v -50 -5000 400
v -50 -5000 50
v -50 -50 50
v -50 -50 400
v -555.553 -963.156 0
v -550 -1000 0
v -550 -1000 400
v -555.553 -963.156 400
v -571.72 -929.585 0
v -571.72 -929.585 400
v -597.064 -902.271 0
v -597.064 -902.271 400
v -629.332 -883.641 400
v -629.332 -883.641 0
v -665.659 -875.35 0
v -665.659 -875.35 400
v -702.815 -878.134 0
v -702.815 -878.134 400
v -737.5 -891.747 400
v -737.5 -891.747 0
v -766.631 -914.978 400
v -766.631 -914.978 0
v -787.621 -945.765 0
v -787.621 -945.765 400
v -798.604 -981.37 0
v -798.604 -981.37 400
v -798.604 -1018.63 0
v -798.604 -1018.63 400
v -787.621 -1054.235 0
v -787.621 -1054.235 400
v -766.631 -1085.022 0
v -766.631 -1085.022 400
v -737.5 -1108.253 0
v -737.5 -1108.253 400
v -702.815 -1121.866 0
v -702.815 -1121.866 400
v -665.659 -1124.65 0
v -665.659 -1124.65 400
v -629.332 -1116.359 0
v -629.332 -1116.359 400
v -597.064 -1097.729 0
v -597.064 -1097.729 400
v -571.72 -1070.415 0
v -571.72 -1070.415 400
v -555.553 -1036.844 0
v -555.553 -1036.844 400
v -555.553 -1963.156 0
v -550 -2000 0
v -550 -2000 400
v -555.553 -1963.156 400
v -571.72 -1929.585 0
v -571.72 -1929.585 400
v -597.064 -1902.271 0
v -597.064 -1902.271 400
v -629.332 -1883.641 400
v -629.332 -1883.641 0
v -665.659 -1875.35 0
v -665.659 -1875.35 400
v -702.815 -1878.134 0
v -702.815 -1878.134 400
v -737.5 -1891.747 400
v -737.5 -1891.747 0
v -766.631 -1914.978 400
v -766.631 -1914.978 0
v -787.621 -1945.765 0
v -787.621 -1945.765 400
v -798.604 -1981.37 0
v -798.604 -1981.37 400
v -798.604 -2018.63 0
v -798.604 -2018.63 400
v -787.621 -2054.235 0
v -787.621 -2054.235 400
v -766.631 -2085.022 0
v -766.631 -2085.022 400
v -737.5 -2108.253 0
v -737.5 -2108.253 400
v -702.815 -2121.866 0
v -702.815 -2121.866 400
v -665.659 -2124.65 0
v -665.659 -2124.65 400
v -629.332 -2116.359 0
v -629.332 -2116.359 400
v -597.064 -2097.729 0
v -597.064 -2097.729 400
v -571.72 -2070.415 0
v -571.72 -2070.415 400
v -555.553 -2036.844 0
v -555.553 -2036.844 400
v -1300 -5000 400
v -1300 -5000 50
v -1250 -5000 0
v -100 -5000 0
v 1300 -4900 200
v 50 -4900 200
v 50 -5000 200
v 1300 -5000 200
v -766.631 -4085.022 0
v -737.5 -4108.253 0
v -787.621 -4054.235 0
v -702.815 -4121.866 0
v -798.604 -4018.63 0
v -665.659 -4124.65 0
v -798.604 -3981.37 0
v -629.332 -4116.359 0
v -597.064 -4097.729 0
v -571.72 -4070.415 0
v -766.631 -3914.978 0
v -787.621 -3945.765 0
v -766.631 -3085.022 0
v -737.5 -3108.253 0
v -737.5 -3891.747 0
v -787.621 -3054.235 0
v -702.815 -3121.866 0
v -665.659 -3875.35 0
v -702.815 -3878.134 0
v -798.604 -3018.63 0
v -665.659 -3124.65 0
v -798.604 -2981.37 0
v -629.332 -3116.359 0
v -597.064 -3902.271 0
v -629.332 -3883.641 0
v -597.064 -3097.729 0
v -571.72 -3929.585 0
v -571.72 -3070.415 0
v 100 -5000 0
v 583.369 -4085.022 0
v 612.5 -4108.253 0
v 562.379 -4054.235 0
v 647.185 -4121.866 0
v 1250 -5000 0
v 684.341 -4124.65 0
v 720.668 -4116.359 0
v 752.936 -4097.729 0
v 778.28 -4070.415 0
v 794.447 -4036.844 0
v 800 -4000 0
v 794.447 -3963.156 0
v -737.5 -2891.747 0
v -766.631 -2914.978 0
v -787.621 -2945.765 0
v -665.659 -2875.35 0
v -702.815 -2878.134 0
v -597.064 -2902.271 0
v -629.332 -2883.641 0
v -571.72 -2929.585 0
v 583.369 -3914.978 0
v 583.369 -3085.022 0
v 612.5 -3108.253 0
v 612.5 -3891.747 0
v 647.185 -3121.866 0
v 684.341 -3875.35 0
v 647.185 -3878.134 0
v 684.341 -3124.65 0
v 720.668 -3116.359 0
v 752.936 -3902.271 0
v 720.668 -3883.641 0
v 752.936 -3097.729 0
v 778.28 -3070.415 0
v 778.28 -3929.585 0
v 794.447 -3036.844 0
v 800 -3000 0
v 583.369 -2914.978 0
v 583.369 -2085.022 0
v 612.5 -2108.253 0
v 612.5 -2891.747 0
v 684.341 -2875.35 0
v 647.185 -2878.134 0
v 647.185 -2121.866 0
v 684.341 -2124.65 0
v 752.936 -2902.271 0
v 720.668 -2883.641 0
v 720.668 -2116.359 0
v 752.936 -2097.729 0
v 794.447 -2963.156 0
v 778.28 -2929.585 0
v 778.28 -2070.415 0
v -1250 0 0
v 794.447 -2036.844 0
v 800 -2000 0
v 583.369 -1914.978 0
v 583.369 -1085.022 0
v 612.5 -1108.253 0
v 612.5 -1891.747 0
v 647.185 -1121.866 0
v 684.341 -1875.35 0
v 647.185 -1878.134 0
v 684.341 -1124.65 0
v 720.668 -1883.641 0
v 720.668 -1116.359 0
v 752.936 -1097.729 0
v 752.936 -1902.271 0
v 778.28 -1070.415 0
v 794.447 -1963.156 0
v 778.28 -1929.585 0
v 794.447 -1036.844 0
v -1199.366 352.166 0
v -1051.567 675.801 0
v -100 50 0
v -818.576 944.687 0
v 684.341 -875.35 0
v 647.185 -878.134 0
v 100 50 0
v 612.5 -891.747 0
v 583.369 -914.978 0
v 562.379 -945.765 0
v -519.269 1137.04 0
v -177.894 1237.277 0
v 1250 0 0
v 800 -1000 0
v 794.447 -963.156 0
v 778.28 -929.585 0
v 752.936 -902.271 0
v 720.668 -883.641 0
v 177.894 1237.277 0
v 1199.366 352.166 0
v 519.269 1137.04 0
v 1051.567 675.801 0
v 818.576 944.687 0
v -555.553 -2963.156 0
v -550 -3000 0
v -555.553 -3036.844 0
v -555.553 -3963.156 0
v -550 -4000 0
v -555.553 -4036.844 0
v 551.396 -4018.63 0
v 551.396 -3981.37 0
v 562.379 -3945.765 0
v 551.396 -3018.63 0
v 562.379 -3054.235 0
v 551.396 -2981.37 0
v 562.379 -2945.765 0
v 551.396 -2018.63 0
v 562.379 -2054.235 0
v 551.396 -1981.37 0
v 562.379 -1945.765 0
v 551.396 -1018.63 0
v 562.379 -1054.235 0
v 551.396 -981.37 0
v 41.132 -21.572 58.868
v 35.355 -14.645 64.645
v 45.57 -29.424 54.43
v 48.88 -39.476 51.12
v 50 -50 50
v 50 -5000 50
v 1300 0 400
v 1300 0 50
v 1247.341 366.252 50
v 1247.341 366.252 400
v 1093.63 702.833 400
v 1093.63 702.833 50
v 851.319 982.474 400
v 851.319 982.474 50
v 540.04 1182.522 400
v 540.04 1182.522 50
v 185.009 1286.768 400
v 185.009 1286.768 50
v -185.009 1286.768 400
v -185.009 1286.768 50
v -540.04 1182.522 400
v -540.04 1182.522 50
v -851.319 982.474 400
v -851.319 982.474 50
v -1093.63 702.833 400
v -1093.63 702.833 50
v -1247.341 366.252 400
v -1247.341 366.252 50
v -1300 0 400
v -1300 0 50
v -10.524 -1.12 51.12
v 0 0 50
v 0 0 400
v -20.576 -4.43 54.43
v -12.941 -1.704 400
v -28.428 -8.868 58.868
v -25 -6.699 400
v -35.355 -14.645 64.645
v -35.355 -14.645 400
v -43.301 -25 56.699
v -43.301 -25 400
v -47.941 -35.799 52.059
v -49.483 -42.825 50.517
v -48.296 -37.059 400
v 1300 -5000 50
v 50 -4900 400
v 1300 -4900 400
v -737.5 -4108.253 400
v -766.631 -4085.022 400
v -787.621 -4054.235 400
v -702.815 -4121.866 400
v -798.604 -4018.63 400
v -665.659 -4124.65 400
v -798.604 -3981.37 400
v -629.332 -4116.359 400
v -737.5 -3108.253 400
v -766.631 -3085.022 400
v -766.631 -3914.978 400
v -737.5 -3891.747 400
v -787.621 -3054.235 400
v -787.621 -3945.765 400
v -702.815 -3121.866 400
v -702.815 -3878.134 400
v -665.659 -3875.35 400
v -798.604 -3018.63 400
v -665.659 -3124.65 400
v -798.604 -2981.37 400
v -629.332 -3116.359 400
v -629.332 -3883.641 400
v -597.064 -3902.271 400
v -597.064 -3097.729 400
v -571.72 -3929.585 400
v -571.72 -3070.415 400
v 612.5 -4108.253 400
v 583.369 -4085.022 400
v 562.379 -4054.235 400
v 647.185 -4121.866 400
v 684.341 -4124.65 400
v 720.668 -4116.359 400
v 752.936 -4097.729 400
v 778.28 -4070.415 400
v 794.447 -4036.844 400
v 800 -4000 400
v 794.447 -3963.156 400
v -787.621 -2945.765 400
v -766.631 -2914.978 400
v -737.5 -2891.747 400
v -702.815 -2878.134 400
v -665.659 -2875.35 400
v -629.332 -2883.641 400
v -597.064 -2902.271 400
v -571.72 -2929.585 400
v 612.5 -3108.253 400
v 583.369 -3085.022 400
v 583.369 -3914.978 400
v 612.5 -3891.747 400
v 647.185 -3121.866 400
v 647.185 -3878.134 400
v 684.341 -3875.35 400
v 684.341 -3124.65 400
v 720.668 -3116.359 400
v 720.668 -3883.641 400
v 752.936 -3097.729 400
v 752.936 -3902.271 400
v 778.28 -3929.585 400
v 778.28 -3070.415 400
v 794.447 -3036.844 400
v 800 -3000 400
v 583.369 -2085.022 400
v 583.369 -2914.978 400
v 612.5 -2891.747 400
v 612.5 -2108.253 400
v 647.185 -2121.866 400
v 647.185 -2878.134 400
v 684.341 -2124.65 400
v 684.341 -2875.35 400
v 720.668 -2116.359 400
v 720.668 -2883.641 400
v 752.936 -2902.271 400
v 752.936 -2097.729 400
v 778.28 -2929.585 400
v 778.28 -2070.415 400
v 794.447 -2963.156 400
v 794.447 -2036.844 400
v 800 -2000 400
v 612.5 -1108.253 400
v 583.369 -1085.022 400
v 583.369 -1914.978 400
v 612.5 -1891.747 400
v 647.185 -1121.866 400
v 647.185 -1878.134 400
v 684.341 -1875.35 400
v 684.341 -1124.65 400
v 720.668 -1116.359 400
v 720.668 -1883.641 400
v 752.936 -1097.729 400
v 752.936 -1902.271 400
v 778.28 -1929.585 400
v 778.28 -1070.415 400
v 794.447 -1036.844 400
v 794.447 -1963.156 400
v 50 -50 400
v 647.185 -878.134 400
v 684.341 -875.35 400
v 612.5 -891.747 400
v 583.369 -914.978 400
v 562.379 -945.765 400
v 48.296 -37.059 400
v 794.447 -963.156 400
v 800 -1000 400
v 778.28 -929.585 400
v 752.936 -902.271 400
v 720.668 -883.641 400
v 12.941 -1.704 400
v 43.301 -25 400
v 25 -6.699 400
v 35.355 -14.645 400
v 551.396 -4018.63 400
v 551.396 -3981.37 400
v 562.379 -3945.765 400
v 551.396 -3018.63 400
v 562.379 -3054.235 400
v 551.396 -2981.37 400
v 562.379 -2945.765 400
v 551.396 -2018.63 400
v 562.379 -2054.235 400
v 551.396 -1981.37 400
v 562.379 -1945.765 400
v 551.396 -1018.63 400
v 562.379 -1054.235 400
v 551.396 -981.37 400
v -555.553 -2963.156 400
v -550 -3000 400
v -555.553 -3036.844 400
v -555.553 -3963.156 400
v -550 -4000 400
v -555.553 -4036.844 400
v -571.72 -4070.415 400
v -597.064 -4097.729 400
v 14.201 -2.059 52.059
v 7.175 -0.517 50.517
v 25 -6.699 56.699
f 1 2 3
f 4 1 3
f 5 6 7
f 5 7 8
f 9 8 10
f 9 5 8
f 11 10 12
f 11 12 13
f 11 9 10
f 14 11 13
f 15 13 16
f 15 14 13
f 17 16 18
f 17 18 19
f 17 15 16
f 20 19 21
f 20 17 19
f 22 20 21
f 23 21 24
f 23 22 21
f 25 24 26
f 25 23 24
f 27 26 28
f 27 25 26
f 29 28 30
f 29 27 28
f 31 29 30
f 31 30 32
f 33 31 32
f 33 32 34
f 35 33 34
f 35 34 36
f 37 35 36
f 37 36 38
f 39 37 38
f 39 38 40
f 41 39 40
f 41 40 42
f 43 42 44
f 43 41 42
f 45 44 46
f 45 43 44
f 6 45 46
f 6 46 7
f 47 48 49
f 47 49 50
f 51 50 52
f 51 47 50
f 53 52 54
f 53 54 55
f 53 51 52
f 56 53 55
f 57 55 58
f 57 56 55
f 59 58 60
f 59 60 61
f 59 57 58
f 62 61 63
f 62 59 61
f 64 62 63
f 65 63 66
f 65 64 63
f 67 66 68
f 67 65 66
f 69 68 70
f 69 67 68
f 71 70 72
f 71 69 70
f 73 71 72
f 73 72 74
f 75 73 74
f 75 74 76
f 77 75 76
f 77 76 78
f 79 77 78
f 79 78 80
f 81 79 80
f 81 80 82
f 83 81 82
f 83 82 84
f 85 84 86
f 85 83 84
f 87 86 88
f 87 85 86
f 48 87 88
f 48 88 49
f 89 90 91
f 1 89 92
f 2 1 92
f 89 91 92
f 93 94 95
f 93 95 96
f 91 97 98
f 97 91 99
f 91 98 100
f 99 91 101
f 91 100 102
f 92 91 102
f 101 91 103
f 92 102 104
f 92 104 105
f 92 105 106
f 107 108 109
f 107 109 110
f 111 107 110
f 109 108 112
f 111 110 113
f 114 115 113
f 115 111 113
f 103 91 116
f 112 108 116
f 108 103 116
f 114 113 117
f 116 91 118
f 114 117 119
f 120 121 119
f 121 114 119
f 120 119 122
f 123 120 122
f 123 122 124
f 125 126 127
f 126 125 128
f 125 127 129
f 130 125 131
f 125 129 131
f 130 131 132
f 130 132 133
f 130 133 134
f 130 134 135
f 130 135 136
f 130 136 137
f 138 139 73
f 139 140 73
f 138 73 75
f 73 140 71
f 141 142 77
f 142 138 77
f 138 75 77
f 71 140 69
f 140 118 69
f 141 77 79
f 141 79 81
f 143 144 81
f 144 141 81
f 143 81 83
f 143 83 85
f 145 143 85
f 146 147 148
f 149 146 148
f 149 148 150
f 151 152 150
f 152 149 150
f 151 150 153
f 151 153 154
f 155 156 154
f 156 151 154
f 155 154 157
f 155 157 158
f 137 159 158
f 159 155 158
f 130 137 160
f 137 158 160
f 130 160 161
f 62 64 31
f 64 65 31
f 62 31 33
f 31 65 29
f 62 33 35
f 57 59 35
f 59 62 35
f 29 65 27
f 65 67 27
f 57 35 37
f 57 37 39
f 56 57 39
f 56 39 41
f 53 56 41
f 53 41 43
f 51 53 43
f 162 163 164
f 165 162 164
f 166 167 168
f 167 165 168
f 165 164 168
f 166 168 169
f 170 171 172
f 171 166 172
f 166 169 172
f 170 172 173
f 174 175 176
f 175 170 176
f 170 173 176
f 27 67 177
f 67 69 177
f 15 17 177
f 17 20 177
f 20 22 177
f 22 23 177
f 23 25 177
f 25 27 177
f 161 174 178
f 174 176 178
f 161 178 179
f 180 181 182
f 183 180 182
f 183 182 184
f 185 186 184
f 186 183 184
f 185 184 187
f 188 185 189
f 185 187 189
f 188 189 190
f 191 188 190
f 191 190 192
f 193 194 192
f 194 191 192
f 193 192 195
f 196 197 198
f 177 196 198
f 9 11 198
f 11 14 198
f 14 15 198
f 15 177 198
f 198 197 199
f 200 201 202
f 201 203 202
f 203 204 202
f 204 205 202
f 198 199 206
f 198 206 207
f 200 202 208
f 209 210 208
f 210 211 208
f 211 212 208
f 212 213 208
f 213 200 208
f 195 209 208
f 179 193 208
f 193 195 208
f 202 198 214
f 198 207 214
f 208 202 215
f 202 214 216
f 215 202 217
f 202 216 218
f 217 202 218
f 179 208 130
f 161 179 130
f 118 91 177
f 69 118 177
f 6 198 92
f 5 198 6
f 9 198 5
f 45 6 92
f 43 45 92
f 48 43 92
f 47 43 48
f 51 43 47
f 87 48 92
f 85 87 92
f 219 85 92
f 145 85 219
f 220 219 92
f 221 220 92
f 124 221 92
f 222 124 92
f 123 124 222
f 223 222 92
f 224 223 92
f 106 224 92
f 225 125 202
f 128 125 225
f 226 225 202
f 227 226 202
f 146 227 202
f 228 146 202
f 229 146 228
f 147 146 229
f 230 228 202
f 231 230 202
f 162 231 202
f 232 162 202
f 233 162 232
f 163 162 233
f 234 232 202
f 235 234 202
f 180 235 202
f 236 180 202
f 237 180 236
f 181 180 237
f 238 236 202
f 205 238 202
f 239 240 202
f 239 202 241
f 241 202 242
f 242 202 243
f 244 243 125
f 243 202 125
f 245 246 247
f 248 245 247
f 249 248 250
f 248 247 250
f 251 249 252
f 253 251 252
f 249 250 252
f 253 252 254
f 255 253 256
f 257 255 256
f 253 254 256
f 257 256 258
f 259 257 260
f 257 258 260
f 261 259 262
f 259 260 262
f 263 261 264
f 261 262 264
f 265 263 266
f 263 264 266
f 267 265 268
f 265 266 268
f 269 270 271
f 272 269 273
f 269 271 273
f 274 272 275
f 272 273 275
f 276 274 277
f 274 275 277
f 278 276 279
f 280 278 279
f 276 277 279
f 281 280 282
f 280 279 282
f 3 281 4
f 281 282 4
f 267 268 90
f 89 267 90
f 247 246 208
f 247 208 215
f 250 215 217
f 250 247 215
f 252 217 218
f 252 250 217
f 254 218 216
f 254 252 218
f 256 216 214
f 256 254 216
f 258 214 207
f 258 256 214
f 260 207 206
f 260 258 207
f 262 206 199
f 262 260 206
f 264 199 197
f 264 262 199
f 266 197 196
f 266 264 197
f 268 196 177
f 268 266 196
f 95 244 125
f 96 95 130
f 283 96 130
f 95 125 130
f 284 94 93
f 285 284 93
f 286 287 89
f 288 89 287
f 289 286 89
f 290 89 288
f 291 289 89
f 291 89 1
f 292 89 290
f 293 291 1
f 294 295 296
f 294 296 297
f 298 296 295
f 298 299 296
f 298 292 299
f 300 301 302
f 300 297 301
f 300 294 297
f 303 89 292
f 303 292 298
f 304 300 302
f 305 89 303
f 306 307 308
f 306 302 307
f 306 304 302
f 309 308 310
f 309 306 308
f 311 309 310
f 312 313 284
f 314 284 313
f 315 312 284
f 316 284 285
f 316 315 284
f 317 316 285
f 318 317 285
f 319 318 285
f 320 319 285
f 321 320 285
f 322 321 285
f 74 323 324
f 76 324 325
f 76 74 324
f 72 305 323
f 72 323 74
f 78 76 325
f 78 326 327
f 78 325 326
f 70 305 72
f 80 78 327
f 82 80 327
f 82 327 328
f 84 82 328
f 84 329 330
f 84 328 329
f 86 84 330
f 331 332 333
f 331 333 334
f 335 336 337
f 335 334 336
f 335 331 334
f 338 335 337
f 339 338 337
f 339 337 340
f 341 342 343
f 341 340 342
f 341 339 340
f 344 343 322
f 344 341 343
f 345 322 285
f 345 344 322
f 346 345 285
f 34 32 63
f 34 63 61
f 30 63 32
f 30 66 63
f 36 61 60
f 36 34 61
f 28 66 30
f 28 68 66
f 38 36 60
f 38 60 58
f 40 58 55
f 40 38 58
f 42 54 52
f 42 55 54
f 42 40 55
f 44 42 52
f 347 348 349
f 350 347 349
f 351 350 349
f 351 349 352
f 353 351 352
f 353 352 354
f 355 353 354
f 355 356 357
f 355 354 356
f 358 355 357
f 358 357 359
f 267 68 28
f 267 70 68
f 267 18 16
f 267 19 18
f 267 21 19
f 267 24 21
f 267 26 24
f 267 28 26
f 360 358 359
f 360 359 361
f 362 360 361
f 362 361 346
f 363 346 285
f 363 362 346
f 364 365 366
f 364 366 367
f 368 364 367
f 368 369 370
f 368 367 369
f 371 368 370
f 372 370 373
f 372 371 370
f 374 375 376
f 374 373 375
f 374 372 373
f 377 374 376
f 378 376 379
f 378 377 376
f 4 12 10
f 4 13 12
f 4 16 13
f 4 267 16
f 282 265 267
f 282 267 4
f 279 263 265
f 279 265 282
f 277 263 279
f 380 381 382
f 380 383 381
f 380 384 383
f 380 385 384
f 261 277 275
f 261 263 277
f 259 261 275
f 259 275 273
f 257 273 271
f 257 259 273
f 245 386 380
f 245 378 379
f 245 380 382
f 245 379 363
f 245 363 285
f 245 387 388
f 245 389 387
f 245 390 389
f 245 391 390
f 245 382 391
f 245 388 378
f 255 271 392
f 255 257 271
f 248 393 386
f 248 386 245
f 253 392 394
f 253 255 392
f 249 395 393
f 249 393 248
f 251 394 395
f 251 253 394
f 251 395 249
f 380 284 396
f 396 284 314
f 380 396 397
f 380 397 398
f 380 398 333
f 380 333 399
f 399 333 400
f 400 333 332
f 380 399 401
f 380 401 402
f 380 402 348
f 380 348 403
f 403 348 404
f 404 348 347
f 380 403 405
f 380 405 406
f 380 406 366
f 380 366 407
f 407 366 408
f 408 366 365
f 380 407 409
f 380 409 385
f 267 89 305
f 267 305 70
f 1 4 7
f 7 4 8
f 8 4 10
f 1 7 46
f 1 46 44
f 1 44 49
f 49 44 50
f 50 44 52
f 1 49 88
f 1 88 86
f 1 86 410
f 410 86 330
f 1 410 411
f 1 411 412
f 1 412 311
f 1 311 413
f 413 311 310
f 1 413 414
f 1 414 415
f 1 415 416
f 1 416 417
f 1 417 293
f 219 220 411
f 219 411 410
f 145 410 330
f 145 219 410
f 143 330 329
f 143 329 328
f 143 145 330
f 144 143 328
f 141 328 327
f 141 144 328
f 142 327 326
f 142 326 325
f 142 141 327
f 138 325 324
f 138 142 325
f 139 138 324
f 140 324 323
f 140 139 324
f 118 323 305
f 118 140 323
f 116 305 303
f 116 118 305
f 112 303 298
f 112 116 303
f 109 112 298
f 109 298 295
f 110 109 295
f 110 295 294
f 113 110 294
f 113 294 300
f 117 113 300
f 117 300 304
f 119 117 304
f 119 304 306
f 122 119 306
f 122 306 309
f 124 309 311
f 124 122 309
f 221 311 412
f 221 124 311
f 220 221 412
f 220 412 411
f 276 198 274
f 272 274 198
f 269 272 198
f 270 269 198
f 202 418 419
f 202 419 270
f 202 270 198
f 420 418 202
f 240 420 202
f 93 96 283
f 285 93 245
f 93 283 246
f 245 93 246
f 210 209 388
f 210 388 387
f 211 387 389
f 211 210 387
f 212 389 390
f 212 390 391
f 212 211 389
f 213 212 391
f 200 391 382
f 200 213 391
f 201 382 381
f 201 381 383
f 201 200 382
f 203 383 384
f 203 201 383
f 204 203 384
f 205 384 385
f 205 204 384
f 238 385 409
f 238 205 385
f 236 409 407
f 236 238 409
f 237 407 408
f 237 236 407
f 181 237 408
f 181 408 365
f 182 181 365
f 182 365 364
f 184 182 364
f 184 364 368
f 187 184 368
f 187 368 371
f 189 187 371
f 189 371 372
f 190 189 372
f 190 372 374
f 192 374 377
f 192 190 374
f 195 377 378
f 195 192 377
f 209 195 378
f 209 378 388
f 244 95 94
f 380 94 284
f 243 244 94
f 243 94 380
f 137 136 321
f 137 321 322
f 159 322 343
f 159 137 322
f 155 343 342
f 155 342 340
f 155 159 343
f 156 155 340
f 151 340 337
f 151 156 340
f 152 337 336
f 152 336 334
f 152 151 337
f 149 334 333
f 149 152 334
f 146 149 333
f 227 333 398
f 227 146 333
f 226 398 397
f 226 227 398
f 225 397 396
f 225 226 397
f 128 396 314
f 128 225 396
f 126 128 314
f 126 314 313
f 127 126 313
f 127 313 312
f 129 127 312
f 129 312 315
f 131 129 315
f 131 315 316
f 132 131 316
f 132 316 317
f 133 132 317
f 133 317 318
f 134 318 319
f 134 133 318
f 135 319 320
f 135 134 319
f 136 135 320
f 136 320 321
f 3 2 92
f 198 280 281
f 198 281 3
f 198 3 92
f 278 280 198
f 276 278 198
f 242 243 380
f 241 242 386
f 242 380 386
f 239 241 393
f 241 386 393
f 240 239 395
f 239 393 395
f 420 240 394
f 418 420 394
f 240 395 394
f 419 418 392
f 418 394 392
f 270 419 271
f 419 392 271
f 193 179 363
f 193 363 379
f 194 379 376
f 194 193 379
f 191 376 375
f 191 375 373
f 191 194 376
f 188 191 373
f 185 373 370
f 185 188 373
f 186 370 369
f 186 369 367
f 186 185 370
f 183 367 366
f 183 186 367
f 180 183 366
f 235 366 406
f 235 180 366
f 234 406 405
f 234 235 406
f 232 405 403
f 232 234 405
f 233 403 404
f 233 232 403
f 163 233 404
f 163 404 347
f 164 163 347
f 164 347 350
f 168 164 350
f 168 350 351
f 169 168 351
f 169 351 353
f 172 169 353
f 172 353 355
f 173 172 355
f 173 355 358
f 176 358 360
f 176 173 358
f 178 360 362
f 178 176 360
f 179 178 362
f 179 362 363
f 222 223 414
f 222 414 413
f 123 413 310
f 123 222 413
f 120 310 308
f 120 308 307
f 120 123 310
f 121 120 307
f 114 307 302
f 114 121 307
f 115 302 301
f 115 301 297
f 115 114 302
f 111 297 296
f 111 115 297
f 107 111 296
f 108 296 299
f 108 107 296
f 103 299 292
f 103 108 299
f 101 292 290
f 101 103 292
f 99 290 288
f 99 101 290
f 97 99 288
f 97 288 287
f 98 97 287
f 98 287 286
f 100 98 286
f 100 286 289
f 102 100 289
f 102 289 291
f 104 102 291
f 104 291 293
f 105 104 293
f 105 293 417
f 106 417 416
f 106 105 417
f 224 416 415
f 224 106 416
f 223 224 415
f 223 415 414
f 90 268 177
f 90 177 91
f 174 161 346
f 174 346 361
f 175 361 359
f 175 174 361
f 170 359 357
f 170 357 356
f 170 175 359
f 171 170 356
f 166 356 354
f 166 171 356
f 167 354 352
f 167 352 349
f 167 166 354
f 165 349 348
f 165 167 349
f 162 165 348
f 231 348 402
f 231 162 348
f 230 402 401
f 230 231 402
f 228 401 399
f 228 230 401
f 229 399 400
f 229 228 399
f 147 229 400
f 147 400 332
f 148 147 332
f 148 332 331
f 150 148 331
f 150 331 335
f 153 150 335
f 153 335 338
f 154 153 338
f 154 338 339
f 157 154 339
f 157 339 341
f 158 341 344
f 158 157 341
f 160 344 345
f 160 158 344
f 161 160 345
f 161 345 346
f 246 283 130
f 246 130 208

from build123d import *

# Parameters (mm, degrees)
F0_R     = 125
F1_DEPTH = 400
F0_W     = 1250
F0_H     = 100
F2_DEPTH = 200
F3_SIZE  = 50
F4_R     = 49.99999


# Not quite as in the source:
# - a fillet or chamfer is up to 0.001 mm smaller than in the source, because OpenCascade refuses the exact size


with BuildPart() as f1:
    # F0 (on Top) → F1 (new body)
    with BuildSketch(Plane.XY):
        with BuildLine():
            Line((-50, 0), (0, 0))
            Line((0, 0), (50, 0))
            Line((50, 0), (50, -4900))
            Line((50, -4900), (1300, -4900))
            Line((1300, -4900), (1300, 0))
            ThreePointArc((1300, 0), (0, 1300), (-1300, 0))
            Line((-1300, 0), (-1300, -5000))
            Line((-1300, -5000), (-50, -5000))
            Line((-50, -5000), (-50, 0))
        make_face()
        with Locations((-675, -4000)):
            Circle(F0_R, mode=Mode.SUBTRACT)
        with Locations((-675, -3000)):
            Circle(F0_R, mode=Mode.SUBTRACT)
        with Locations((-675, -2000)):
            Circle(F0_R, mode=Mode.SUBTRACT)
        with Locations((675, -4000)):
            Circle(F0_R, mode=Mode.SUBTRACT)
        with Locations((675, -3000)):
            Circle(F0_R, mode=Mode.SUBTRACT)
        with Locations((675, -2000)):
            Circle(F0_R, mode=Mode.SUBTRACT)
        with Locations((-675, -1000)):
            Circle(F0_R, mode=Mode.SUBTRACT)
        with Locations((675, -1000)):
            Circle(F0_R, mode=Mode.SUBTRACT)
    extrude(amount=F1_DEPTH)

    # F0 (on Top) → F2 (join)
    with BuildSketch(Plane.XY):
        with Locations((675, -4950)):
            Rectangle(F0_W, F0_H)
    extrude(amount=F2_DEPTH)

    # F3
    f3_edges = [f1.edges().sort_by_distance(p)[0] for p in [
        (-1300, -2500, 0),
        (0, 1300, 0),
        (1300, -2500, 0),
        (-50, -2500, 0),
        (50, -2500, 0),
        (0, 0, 0),
    ]]
    chamfer(f3_edges, length=F3_SIZE)

    # F4 (radius 50 in the source; OpenCascade refuses exactly that, so slightly less here)
    f4_edges = [f1.edges().sort_by_distance(p)[0] for p in [
        (50, 0, 225),
        (-50, 0, 225),
    ]]
    fillet(f4_edges, radius=F4_R)


solid = f1.part
